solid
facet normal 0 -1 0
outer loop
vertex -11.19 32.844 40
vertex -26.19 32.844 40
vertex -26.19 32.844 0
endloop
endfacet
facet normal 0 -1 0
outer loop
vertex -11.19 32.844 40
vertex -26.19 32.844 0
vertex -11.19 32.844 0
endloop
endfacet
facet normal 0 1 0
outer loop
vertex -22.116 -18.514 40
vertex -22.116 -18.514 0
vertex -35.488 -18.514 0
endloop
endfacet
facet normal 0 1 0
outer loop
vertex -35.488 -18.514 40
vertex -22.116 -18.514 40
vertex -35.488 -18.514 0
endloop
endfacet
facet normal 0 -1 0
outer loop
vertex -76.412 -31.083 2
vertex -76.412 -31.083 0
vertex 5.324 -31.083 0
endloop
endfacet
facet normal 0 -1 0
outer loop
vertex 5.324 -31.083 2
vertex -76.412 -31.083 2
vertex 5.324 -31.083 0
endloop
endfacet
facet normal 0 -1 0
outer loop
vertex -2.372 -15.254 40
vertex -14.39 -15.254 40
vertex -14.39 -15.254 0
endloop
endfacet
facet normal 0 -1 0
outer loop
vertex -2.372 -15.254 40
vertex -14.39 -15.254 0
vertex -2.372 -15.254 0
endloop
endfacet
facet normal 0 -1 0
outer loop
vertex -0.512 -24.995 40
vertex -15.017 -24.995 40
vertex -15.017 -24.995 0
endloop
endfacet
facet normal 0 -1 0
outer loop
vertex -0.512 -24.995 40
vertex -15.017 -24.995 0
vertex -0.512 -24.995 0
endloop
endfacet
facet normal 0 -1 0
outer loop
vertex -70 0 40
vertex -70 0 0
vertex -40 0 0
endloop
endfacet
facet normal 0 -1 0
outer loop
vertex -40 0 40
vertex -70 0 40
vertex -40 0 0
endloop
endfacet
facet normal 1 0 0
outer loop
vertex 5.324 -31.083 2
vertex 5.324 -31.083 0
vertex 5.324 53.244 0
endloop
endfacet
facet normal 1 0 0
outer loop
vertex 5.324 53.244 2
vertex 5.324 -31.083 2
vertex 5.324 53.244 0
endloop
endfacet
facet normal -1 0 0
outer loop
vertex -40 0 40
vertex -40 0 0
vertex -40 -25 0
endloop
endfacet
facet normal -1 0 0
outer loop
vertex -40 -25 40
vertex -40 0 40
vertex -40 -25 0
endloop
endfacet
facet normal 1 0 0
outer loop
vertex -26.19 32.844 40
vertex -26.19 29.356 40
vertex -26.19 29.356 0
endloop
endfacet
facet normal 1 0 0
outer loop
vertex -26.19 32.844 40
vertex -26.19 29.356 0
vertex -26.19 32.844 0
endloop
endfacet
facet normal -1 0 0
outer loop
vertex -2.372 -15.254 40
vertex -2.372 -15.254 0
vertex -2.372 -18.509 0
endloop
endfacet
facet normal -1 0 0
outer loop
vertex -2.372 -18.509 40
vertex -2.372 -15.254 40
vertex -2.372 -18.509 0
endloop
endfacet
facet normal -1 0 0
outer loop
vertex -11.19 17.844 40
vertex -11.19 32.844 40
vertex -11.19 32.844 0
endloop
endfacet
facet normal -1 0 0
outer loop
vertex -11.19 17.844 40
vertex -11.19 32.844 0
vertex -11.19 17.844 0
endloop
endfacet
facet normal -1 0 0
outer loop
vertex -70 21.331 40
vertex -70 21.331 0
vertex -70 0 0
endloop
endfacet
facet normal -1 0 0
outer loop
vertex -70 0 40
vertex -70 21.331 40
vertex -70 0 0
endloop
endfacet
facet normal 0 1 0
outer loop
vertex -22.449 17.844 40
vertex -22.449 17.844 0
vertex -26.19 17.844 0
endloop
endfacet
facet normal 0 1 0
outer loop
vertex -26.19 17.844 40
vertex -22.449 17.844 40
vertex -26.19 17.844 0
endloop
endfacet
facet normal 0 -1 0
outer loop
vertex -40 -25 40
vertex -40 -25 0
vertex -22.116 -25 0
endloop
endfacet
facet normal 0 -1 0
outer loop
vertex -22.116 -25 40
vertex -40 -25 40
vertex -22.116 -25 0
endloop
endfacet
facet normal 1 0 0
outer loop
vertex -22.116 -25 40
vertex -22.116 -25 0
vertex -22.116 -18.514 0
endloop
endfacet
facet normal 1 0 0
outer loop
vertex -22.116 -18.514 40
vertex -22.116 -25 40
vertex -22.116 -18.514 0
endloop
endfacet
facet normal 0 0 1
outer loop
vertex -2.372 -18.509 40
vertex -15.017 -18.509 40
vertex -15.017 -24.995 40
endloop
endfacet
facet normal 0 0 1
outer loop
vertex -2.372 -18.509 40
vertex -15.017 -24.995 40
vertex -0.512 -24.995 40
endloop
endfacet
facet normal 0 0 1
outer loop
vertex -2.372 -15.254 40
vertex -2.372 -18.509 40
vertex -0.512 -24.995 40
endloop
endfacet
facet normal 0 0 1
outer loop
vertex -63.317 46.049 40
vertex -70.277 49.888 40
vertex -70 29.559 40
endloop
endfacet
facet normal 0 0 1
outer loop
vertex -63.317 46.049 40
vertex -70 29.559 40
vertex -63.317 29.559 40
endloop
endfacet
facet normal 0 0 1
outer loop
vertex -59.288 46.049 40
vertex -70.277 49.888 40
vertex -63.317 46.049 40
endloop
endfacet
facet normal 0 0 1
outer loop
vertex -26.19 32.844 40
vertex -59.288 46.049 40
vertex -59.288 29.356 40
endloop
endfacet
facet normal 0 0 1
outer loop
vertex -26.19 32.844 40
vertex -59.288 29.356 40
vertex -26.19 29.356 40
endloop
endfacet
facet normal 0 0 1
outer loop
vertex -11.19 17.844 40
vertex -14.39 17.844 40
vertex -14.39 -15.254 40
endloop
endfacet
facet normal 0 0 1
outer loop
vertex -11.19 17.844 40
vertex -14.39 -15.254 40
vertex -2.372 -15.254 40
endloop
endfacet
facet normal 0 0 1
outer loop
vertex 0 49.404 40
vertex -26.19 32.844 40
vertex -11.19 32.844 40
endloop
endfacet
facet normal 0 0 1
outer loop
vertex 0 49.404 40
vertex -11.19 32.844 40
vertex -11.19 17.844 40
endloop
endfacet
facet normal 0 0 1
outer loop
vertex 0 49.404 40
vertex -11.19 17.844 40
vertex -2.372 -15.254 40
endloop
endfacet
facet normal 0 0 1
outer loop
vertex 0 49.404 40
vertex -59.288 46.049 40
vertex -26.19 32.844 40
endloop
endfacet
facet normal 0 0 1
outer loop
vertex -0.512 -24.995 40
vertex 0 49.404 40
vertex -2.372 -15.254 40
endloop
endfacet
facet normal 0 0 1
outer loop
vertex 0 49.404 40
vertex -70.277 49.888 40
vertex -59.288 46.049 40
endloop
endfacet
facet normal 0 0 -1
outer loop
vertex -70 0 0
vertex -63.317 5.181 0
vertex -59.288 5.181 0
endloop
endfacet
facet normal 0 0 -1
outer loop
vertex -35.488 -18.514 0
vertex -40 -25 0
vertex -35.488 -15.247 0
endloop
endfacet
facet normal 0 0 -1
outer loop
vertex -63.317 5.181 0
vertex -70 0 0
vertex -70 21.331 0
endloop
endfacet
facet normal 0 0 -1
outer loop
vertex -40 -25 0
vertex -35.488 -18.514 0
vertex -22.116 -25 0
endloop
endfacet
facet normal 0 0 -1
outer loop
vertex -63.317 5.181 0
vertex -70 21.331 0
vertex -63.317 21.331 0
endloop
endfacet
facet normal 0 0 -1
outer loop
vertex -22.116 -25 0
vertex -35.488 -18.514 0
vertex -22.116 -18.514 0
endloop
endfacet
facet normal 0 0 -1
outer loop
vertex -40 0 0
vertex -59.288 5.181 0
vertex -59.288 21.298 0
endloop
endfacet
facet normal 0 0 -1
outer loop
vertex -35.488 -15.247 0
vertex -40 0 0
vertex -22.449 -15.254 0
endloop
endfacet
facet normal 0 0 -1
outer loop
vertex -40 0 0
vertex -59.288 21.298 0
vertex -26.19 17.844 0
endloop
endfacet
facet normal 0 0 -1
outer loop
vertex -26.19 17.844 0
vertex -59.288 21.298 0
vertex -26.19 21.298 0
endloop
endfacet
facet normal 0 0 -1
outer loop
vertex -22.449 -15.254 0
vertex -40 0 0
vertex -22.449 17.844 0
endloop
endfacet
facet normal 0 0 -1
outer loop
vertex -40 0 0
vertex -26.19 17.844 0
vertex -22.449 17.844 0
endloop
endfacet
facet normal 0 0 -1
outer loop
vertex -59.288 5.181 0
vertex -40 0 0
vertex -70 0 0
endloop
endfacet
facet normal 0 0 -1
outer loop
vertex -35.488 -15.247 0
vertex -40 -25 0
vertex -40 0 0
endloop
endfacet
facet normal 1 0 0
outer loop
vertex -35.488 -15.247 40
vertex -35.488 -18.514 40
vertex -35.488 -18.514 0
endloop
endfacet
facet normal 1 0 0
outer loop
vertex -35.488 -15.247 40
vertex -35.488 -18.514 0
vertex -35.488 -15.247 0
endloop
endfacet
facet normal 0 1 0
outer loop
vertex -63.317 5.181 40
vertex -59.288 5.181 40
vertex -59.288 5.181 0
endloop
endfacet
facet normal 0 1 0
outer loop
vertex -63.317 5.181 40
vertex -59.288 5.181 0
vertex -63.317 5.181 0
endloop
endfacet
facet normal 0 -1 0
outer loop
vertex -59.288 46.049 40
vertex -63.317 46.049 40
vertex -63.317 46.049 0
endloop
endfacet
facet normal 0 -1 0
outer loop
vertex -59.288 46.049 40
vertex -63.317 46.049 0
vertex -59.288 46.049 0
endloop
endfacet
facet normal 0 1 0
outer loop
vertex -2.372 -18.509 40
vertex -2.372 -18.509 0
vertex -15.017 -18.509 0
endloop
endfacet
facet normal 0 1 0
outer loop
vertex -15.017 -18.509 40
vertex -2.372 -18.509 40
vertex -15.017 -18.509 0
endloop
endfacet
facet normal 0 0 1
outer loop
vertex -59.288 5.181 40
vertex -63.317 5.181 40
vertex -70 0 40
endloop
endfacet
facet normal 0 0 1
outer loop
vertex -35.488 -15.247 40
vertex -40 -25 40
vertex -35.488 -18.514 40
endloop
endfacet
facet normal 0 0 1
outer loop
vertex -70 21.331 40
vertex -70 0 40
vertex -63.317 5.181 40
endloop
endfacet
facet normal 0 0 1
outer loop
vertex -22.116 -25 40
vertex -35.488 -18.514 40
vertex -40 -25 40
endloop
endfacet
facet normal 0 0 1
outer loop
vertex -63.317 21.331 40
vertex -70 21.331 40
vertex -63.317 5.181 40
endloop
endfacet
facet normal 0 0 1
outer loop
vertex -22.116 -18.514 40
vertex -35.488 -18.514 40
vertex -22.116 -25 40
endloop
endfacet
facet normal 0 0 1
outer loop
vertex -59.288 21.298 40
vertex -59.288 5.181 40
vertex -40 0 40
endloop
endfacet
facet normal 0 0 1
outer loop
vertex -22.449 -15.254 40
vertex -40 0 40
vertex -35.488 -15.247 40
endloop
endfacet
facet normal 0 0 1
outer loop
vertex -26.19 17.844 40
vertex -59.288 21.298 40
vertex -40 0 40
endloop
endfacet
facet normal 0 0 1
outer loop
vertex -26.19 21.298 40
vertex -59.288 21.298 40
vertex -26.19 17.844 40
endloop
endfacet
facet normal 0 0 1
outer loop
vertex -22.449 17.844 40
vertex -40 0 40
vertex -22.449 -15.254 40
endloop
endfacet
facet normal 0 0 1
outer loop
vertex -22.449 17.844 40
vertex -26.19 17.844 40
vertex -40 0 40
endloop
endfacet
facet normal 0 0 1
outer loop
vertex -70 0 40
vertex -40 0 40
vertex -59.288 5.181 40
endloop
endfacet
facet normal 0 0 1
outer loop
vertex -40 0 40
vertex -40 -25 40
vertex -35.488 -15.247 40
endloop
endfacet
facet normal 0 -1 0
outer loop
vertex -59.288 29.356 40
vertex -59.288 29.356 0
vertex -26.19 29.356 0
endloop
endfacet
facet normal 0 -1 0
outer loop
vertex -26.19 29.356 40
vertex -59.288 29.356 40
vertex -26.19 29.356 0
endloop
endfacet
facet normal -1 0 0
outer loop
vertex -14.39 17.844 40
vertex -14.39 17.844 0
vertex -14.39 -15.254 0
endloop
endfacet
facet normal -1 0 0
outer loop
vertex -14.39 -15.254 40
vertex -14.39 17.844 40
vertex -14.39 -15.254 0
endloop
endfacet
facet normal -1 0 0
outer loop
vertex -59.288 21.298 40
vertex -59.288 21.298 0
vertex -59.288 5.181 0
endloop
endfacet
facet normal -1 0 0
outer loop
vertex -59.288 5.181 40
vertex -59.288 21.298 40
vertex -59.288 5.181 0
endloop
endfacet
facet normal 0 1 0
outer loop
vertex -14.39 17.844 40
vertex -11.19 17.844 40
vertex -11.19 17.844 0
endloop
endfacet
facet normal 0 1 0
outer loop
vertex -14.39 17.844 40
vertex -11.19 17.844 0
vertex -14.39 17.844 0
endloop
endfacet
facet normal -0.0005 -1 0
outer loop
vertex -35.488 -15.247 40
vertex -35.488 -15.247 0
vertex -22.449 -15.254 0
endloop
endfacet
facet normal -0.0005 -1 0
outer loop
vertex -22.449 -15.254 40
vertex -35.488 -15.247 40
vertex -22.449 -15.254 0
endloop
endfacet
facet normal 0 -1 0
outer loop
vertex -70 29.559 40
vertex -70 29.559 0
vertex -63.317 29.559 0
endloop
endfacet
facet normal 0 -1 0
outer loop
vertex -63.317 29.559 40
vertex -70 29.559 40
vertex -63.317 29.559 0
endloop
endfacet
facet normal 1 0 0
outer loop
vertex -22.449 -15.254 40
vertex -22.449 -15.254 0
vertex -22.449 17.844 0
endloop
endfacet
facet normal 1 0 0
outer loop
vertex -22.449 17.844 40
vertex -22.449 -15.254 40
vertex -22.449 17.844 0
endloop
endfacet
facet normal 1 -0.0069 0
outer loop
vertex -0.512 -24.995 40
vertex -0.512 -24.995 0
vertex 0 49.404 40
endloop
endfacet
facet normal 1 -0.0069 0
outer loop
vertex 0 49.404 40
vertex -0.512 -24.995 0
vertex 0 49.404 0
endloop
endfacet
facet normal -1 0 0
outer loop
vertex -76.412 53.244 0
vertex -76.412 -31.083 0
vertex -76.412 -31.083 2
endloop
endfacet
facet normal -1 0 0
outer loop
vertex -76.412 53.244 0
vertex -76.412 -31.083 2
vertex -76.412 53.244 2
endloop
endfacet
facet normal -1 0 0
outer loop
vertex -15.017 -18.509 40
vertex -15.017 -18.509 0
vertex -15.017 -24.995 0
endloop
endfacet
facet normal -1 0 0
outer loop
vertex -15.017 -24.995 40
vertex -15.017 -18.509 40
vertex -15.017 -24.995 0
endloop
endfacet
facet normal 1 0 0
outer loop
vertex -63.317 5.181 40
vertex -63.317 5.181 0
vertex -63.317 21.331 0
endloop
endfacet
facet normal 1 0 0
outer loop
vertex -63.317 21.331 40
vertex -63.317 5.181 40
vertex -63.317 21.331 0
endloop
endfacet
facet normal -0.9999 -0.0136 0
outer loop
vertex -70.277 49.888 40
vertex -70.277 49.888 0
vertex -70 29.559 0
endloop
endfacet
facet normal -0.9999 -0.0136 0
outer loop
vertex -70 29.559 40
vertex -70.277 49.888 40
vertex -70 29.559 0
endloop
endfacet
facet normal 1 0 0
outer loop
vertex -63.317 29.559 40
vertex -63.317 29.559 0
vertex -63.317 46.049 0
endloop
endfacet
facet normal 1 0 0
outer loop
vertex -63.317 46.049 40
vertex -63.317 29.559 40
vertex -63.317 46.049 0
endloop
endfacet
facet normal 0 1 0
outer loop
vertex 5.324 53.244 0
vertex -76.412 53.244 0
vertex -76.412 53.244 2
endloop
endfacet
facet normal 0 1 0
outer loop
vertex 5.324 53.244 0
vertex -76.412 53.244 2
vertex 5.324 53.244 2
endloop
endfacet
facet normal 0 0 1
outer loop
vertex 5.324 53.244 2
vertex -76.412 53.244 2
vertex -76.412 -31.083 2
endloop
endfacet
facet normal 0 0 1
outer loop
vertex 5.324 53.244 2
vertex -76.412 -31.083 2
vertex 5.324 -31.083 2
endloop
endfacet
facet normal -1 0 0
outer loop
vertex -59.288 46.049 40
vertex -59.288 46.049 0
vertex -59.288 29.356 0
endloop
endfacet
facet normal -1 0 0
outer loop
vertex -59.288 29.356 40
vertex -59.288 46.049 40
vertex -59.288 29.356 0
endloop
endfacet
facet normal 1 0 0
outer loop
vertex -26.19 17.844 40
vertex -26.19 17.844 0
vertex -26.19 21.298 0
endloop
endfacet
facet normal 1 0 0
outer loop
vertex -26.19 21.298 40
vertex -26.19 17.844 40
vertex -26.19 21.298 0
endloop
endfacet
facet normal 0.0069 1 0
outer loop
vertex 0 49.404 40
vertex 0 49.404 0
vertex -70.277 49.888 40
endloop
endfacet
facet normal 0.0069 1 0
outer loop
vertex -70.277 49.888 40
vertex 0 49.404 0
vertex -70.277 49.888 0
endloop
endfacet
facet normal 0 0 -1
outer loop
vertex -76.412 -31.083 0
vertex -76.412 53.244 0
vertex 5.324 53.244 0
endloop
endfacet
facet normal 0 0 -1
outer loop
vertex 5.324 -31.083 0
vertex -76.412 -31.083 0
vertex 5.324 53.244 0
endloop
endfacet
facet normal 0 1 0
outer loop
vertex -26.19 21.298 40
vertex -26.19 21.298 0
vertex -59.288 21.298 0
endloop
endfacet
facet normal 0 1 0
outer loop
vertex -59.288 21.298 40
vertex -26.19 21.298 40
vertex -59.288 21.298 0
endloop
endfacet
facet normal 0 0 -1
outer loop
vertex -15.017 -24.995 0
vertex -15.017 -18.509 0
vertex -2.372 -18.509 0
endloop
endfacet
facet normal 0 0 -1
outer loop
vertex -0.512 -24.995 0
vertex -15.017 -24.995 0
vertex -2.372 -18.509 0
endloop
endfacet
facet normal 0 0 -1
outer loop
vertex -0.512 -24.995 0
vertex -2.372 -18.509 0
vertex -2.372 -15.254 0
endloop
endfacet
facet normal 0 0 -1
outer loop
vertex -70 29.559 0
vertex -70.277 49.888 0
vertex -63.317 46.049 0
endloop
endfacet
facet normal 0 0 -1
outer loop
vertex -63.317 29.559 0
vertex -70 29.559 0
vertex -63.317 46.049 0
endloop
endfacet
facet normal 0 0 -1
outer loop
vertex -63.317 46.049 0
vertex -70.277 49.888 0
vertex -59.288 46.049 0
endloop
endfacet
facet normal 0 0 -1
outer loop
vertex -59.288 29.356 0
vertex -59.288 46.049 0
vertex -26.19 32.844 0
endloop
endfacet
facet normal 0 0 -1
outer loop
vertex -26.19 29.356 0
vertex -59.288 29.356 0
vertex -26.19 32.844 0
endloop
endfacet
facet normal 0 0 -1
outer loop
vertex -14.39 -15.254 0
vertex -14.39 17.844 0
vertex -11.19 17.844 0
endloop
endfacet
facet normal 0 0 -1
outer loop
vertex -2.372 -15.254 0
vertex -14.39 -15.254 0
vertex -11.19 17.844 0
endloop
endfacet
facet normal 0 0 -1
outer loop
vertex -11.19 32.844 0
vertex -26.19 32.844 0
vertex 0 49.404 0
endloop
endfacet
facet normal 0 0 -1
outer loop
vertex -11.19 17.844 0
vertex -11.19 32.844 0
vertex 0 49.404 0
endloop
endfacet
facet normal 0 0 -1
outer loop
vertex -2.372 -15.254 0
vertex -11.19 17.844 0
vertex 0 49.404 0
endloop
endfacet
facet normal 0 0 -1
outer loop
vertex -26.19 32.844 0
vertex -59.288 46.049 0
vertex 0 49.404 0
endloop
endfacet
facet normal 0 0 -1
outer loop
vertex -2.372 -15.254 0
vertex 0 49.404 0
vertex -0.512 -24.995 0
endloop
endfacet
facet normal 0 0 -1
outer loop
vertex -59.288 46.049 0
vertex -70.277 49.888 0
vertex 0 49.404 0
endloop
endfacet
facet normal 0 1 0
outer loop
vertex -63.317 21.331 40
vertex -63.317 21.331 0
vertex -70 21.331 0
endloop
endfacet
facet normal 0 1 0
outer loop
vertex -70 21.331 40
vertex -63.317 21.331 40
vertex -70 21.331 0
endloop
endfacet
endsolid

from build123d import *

# Parameters (mm, degrees)
F1_DEPTH = 40
F2_W     = 81.73683
F2_H     = 84.327088
F3_DEPTH = 2


with BuildPart() as f1:
    # F0 (on Top) → F1 (new body)
    with BuildSketch(Plane.XY):
        Polygon((-70, 0), (-40, 0), (-40, -25), (-22.115748, -25), (-22.115748, -18.514374), (-35.487905, -18.514374), (-35.487905, -15.247175), (-22.448849, -15.253707), (-22.448849, 17.843956), (-26.190324, 17.843956), (-26.190324, 21.297626), (-59.287984, 21.297626), (-59.287984, 5.180503), (-63.317269, 5.180503), (-63.317269, 21.33072), (-70, 21.33072), align=None)
        Polygon((-26.190324, 29.356187), (-26.190324, 32.843956), (-11.190324, 32.843956), (-11.190324, 17.843956), (-14.390289, 17.843956), (-14.390289, -15.253707), (-2.372137, -15.253707), (-2.372137, -18.509066), (-15.016577, -18.509066), (-15.016577, -24.994692), (-0.51242, -24.994692), (0, 49.404442), (-70.2767, 49.888469), (-70, 29.559225), (-63.317269, 29.559225), (-63.317269, 46.048924), (-59.287984, 46.048924), (-59.287984, 29.356187), align=None)
    extrude(amount=F1_DEPTH)


with BuildPart() as f3:
    # F2 (on Top) → F3 (new body)
    with BuildSketch(Plane.XY):
        with Locations((-35.544009, 11.080521)):
            Rectangle(F2_W, F2_H)
    extrude(amount=F3_DEPTH)


solid = Compound([f1.part, f3.part])
